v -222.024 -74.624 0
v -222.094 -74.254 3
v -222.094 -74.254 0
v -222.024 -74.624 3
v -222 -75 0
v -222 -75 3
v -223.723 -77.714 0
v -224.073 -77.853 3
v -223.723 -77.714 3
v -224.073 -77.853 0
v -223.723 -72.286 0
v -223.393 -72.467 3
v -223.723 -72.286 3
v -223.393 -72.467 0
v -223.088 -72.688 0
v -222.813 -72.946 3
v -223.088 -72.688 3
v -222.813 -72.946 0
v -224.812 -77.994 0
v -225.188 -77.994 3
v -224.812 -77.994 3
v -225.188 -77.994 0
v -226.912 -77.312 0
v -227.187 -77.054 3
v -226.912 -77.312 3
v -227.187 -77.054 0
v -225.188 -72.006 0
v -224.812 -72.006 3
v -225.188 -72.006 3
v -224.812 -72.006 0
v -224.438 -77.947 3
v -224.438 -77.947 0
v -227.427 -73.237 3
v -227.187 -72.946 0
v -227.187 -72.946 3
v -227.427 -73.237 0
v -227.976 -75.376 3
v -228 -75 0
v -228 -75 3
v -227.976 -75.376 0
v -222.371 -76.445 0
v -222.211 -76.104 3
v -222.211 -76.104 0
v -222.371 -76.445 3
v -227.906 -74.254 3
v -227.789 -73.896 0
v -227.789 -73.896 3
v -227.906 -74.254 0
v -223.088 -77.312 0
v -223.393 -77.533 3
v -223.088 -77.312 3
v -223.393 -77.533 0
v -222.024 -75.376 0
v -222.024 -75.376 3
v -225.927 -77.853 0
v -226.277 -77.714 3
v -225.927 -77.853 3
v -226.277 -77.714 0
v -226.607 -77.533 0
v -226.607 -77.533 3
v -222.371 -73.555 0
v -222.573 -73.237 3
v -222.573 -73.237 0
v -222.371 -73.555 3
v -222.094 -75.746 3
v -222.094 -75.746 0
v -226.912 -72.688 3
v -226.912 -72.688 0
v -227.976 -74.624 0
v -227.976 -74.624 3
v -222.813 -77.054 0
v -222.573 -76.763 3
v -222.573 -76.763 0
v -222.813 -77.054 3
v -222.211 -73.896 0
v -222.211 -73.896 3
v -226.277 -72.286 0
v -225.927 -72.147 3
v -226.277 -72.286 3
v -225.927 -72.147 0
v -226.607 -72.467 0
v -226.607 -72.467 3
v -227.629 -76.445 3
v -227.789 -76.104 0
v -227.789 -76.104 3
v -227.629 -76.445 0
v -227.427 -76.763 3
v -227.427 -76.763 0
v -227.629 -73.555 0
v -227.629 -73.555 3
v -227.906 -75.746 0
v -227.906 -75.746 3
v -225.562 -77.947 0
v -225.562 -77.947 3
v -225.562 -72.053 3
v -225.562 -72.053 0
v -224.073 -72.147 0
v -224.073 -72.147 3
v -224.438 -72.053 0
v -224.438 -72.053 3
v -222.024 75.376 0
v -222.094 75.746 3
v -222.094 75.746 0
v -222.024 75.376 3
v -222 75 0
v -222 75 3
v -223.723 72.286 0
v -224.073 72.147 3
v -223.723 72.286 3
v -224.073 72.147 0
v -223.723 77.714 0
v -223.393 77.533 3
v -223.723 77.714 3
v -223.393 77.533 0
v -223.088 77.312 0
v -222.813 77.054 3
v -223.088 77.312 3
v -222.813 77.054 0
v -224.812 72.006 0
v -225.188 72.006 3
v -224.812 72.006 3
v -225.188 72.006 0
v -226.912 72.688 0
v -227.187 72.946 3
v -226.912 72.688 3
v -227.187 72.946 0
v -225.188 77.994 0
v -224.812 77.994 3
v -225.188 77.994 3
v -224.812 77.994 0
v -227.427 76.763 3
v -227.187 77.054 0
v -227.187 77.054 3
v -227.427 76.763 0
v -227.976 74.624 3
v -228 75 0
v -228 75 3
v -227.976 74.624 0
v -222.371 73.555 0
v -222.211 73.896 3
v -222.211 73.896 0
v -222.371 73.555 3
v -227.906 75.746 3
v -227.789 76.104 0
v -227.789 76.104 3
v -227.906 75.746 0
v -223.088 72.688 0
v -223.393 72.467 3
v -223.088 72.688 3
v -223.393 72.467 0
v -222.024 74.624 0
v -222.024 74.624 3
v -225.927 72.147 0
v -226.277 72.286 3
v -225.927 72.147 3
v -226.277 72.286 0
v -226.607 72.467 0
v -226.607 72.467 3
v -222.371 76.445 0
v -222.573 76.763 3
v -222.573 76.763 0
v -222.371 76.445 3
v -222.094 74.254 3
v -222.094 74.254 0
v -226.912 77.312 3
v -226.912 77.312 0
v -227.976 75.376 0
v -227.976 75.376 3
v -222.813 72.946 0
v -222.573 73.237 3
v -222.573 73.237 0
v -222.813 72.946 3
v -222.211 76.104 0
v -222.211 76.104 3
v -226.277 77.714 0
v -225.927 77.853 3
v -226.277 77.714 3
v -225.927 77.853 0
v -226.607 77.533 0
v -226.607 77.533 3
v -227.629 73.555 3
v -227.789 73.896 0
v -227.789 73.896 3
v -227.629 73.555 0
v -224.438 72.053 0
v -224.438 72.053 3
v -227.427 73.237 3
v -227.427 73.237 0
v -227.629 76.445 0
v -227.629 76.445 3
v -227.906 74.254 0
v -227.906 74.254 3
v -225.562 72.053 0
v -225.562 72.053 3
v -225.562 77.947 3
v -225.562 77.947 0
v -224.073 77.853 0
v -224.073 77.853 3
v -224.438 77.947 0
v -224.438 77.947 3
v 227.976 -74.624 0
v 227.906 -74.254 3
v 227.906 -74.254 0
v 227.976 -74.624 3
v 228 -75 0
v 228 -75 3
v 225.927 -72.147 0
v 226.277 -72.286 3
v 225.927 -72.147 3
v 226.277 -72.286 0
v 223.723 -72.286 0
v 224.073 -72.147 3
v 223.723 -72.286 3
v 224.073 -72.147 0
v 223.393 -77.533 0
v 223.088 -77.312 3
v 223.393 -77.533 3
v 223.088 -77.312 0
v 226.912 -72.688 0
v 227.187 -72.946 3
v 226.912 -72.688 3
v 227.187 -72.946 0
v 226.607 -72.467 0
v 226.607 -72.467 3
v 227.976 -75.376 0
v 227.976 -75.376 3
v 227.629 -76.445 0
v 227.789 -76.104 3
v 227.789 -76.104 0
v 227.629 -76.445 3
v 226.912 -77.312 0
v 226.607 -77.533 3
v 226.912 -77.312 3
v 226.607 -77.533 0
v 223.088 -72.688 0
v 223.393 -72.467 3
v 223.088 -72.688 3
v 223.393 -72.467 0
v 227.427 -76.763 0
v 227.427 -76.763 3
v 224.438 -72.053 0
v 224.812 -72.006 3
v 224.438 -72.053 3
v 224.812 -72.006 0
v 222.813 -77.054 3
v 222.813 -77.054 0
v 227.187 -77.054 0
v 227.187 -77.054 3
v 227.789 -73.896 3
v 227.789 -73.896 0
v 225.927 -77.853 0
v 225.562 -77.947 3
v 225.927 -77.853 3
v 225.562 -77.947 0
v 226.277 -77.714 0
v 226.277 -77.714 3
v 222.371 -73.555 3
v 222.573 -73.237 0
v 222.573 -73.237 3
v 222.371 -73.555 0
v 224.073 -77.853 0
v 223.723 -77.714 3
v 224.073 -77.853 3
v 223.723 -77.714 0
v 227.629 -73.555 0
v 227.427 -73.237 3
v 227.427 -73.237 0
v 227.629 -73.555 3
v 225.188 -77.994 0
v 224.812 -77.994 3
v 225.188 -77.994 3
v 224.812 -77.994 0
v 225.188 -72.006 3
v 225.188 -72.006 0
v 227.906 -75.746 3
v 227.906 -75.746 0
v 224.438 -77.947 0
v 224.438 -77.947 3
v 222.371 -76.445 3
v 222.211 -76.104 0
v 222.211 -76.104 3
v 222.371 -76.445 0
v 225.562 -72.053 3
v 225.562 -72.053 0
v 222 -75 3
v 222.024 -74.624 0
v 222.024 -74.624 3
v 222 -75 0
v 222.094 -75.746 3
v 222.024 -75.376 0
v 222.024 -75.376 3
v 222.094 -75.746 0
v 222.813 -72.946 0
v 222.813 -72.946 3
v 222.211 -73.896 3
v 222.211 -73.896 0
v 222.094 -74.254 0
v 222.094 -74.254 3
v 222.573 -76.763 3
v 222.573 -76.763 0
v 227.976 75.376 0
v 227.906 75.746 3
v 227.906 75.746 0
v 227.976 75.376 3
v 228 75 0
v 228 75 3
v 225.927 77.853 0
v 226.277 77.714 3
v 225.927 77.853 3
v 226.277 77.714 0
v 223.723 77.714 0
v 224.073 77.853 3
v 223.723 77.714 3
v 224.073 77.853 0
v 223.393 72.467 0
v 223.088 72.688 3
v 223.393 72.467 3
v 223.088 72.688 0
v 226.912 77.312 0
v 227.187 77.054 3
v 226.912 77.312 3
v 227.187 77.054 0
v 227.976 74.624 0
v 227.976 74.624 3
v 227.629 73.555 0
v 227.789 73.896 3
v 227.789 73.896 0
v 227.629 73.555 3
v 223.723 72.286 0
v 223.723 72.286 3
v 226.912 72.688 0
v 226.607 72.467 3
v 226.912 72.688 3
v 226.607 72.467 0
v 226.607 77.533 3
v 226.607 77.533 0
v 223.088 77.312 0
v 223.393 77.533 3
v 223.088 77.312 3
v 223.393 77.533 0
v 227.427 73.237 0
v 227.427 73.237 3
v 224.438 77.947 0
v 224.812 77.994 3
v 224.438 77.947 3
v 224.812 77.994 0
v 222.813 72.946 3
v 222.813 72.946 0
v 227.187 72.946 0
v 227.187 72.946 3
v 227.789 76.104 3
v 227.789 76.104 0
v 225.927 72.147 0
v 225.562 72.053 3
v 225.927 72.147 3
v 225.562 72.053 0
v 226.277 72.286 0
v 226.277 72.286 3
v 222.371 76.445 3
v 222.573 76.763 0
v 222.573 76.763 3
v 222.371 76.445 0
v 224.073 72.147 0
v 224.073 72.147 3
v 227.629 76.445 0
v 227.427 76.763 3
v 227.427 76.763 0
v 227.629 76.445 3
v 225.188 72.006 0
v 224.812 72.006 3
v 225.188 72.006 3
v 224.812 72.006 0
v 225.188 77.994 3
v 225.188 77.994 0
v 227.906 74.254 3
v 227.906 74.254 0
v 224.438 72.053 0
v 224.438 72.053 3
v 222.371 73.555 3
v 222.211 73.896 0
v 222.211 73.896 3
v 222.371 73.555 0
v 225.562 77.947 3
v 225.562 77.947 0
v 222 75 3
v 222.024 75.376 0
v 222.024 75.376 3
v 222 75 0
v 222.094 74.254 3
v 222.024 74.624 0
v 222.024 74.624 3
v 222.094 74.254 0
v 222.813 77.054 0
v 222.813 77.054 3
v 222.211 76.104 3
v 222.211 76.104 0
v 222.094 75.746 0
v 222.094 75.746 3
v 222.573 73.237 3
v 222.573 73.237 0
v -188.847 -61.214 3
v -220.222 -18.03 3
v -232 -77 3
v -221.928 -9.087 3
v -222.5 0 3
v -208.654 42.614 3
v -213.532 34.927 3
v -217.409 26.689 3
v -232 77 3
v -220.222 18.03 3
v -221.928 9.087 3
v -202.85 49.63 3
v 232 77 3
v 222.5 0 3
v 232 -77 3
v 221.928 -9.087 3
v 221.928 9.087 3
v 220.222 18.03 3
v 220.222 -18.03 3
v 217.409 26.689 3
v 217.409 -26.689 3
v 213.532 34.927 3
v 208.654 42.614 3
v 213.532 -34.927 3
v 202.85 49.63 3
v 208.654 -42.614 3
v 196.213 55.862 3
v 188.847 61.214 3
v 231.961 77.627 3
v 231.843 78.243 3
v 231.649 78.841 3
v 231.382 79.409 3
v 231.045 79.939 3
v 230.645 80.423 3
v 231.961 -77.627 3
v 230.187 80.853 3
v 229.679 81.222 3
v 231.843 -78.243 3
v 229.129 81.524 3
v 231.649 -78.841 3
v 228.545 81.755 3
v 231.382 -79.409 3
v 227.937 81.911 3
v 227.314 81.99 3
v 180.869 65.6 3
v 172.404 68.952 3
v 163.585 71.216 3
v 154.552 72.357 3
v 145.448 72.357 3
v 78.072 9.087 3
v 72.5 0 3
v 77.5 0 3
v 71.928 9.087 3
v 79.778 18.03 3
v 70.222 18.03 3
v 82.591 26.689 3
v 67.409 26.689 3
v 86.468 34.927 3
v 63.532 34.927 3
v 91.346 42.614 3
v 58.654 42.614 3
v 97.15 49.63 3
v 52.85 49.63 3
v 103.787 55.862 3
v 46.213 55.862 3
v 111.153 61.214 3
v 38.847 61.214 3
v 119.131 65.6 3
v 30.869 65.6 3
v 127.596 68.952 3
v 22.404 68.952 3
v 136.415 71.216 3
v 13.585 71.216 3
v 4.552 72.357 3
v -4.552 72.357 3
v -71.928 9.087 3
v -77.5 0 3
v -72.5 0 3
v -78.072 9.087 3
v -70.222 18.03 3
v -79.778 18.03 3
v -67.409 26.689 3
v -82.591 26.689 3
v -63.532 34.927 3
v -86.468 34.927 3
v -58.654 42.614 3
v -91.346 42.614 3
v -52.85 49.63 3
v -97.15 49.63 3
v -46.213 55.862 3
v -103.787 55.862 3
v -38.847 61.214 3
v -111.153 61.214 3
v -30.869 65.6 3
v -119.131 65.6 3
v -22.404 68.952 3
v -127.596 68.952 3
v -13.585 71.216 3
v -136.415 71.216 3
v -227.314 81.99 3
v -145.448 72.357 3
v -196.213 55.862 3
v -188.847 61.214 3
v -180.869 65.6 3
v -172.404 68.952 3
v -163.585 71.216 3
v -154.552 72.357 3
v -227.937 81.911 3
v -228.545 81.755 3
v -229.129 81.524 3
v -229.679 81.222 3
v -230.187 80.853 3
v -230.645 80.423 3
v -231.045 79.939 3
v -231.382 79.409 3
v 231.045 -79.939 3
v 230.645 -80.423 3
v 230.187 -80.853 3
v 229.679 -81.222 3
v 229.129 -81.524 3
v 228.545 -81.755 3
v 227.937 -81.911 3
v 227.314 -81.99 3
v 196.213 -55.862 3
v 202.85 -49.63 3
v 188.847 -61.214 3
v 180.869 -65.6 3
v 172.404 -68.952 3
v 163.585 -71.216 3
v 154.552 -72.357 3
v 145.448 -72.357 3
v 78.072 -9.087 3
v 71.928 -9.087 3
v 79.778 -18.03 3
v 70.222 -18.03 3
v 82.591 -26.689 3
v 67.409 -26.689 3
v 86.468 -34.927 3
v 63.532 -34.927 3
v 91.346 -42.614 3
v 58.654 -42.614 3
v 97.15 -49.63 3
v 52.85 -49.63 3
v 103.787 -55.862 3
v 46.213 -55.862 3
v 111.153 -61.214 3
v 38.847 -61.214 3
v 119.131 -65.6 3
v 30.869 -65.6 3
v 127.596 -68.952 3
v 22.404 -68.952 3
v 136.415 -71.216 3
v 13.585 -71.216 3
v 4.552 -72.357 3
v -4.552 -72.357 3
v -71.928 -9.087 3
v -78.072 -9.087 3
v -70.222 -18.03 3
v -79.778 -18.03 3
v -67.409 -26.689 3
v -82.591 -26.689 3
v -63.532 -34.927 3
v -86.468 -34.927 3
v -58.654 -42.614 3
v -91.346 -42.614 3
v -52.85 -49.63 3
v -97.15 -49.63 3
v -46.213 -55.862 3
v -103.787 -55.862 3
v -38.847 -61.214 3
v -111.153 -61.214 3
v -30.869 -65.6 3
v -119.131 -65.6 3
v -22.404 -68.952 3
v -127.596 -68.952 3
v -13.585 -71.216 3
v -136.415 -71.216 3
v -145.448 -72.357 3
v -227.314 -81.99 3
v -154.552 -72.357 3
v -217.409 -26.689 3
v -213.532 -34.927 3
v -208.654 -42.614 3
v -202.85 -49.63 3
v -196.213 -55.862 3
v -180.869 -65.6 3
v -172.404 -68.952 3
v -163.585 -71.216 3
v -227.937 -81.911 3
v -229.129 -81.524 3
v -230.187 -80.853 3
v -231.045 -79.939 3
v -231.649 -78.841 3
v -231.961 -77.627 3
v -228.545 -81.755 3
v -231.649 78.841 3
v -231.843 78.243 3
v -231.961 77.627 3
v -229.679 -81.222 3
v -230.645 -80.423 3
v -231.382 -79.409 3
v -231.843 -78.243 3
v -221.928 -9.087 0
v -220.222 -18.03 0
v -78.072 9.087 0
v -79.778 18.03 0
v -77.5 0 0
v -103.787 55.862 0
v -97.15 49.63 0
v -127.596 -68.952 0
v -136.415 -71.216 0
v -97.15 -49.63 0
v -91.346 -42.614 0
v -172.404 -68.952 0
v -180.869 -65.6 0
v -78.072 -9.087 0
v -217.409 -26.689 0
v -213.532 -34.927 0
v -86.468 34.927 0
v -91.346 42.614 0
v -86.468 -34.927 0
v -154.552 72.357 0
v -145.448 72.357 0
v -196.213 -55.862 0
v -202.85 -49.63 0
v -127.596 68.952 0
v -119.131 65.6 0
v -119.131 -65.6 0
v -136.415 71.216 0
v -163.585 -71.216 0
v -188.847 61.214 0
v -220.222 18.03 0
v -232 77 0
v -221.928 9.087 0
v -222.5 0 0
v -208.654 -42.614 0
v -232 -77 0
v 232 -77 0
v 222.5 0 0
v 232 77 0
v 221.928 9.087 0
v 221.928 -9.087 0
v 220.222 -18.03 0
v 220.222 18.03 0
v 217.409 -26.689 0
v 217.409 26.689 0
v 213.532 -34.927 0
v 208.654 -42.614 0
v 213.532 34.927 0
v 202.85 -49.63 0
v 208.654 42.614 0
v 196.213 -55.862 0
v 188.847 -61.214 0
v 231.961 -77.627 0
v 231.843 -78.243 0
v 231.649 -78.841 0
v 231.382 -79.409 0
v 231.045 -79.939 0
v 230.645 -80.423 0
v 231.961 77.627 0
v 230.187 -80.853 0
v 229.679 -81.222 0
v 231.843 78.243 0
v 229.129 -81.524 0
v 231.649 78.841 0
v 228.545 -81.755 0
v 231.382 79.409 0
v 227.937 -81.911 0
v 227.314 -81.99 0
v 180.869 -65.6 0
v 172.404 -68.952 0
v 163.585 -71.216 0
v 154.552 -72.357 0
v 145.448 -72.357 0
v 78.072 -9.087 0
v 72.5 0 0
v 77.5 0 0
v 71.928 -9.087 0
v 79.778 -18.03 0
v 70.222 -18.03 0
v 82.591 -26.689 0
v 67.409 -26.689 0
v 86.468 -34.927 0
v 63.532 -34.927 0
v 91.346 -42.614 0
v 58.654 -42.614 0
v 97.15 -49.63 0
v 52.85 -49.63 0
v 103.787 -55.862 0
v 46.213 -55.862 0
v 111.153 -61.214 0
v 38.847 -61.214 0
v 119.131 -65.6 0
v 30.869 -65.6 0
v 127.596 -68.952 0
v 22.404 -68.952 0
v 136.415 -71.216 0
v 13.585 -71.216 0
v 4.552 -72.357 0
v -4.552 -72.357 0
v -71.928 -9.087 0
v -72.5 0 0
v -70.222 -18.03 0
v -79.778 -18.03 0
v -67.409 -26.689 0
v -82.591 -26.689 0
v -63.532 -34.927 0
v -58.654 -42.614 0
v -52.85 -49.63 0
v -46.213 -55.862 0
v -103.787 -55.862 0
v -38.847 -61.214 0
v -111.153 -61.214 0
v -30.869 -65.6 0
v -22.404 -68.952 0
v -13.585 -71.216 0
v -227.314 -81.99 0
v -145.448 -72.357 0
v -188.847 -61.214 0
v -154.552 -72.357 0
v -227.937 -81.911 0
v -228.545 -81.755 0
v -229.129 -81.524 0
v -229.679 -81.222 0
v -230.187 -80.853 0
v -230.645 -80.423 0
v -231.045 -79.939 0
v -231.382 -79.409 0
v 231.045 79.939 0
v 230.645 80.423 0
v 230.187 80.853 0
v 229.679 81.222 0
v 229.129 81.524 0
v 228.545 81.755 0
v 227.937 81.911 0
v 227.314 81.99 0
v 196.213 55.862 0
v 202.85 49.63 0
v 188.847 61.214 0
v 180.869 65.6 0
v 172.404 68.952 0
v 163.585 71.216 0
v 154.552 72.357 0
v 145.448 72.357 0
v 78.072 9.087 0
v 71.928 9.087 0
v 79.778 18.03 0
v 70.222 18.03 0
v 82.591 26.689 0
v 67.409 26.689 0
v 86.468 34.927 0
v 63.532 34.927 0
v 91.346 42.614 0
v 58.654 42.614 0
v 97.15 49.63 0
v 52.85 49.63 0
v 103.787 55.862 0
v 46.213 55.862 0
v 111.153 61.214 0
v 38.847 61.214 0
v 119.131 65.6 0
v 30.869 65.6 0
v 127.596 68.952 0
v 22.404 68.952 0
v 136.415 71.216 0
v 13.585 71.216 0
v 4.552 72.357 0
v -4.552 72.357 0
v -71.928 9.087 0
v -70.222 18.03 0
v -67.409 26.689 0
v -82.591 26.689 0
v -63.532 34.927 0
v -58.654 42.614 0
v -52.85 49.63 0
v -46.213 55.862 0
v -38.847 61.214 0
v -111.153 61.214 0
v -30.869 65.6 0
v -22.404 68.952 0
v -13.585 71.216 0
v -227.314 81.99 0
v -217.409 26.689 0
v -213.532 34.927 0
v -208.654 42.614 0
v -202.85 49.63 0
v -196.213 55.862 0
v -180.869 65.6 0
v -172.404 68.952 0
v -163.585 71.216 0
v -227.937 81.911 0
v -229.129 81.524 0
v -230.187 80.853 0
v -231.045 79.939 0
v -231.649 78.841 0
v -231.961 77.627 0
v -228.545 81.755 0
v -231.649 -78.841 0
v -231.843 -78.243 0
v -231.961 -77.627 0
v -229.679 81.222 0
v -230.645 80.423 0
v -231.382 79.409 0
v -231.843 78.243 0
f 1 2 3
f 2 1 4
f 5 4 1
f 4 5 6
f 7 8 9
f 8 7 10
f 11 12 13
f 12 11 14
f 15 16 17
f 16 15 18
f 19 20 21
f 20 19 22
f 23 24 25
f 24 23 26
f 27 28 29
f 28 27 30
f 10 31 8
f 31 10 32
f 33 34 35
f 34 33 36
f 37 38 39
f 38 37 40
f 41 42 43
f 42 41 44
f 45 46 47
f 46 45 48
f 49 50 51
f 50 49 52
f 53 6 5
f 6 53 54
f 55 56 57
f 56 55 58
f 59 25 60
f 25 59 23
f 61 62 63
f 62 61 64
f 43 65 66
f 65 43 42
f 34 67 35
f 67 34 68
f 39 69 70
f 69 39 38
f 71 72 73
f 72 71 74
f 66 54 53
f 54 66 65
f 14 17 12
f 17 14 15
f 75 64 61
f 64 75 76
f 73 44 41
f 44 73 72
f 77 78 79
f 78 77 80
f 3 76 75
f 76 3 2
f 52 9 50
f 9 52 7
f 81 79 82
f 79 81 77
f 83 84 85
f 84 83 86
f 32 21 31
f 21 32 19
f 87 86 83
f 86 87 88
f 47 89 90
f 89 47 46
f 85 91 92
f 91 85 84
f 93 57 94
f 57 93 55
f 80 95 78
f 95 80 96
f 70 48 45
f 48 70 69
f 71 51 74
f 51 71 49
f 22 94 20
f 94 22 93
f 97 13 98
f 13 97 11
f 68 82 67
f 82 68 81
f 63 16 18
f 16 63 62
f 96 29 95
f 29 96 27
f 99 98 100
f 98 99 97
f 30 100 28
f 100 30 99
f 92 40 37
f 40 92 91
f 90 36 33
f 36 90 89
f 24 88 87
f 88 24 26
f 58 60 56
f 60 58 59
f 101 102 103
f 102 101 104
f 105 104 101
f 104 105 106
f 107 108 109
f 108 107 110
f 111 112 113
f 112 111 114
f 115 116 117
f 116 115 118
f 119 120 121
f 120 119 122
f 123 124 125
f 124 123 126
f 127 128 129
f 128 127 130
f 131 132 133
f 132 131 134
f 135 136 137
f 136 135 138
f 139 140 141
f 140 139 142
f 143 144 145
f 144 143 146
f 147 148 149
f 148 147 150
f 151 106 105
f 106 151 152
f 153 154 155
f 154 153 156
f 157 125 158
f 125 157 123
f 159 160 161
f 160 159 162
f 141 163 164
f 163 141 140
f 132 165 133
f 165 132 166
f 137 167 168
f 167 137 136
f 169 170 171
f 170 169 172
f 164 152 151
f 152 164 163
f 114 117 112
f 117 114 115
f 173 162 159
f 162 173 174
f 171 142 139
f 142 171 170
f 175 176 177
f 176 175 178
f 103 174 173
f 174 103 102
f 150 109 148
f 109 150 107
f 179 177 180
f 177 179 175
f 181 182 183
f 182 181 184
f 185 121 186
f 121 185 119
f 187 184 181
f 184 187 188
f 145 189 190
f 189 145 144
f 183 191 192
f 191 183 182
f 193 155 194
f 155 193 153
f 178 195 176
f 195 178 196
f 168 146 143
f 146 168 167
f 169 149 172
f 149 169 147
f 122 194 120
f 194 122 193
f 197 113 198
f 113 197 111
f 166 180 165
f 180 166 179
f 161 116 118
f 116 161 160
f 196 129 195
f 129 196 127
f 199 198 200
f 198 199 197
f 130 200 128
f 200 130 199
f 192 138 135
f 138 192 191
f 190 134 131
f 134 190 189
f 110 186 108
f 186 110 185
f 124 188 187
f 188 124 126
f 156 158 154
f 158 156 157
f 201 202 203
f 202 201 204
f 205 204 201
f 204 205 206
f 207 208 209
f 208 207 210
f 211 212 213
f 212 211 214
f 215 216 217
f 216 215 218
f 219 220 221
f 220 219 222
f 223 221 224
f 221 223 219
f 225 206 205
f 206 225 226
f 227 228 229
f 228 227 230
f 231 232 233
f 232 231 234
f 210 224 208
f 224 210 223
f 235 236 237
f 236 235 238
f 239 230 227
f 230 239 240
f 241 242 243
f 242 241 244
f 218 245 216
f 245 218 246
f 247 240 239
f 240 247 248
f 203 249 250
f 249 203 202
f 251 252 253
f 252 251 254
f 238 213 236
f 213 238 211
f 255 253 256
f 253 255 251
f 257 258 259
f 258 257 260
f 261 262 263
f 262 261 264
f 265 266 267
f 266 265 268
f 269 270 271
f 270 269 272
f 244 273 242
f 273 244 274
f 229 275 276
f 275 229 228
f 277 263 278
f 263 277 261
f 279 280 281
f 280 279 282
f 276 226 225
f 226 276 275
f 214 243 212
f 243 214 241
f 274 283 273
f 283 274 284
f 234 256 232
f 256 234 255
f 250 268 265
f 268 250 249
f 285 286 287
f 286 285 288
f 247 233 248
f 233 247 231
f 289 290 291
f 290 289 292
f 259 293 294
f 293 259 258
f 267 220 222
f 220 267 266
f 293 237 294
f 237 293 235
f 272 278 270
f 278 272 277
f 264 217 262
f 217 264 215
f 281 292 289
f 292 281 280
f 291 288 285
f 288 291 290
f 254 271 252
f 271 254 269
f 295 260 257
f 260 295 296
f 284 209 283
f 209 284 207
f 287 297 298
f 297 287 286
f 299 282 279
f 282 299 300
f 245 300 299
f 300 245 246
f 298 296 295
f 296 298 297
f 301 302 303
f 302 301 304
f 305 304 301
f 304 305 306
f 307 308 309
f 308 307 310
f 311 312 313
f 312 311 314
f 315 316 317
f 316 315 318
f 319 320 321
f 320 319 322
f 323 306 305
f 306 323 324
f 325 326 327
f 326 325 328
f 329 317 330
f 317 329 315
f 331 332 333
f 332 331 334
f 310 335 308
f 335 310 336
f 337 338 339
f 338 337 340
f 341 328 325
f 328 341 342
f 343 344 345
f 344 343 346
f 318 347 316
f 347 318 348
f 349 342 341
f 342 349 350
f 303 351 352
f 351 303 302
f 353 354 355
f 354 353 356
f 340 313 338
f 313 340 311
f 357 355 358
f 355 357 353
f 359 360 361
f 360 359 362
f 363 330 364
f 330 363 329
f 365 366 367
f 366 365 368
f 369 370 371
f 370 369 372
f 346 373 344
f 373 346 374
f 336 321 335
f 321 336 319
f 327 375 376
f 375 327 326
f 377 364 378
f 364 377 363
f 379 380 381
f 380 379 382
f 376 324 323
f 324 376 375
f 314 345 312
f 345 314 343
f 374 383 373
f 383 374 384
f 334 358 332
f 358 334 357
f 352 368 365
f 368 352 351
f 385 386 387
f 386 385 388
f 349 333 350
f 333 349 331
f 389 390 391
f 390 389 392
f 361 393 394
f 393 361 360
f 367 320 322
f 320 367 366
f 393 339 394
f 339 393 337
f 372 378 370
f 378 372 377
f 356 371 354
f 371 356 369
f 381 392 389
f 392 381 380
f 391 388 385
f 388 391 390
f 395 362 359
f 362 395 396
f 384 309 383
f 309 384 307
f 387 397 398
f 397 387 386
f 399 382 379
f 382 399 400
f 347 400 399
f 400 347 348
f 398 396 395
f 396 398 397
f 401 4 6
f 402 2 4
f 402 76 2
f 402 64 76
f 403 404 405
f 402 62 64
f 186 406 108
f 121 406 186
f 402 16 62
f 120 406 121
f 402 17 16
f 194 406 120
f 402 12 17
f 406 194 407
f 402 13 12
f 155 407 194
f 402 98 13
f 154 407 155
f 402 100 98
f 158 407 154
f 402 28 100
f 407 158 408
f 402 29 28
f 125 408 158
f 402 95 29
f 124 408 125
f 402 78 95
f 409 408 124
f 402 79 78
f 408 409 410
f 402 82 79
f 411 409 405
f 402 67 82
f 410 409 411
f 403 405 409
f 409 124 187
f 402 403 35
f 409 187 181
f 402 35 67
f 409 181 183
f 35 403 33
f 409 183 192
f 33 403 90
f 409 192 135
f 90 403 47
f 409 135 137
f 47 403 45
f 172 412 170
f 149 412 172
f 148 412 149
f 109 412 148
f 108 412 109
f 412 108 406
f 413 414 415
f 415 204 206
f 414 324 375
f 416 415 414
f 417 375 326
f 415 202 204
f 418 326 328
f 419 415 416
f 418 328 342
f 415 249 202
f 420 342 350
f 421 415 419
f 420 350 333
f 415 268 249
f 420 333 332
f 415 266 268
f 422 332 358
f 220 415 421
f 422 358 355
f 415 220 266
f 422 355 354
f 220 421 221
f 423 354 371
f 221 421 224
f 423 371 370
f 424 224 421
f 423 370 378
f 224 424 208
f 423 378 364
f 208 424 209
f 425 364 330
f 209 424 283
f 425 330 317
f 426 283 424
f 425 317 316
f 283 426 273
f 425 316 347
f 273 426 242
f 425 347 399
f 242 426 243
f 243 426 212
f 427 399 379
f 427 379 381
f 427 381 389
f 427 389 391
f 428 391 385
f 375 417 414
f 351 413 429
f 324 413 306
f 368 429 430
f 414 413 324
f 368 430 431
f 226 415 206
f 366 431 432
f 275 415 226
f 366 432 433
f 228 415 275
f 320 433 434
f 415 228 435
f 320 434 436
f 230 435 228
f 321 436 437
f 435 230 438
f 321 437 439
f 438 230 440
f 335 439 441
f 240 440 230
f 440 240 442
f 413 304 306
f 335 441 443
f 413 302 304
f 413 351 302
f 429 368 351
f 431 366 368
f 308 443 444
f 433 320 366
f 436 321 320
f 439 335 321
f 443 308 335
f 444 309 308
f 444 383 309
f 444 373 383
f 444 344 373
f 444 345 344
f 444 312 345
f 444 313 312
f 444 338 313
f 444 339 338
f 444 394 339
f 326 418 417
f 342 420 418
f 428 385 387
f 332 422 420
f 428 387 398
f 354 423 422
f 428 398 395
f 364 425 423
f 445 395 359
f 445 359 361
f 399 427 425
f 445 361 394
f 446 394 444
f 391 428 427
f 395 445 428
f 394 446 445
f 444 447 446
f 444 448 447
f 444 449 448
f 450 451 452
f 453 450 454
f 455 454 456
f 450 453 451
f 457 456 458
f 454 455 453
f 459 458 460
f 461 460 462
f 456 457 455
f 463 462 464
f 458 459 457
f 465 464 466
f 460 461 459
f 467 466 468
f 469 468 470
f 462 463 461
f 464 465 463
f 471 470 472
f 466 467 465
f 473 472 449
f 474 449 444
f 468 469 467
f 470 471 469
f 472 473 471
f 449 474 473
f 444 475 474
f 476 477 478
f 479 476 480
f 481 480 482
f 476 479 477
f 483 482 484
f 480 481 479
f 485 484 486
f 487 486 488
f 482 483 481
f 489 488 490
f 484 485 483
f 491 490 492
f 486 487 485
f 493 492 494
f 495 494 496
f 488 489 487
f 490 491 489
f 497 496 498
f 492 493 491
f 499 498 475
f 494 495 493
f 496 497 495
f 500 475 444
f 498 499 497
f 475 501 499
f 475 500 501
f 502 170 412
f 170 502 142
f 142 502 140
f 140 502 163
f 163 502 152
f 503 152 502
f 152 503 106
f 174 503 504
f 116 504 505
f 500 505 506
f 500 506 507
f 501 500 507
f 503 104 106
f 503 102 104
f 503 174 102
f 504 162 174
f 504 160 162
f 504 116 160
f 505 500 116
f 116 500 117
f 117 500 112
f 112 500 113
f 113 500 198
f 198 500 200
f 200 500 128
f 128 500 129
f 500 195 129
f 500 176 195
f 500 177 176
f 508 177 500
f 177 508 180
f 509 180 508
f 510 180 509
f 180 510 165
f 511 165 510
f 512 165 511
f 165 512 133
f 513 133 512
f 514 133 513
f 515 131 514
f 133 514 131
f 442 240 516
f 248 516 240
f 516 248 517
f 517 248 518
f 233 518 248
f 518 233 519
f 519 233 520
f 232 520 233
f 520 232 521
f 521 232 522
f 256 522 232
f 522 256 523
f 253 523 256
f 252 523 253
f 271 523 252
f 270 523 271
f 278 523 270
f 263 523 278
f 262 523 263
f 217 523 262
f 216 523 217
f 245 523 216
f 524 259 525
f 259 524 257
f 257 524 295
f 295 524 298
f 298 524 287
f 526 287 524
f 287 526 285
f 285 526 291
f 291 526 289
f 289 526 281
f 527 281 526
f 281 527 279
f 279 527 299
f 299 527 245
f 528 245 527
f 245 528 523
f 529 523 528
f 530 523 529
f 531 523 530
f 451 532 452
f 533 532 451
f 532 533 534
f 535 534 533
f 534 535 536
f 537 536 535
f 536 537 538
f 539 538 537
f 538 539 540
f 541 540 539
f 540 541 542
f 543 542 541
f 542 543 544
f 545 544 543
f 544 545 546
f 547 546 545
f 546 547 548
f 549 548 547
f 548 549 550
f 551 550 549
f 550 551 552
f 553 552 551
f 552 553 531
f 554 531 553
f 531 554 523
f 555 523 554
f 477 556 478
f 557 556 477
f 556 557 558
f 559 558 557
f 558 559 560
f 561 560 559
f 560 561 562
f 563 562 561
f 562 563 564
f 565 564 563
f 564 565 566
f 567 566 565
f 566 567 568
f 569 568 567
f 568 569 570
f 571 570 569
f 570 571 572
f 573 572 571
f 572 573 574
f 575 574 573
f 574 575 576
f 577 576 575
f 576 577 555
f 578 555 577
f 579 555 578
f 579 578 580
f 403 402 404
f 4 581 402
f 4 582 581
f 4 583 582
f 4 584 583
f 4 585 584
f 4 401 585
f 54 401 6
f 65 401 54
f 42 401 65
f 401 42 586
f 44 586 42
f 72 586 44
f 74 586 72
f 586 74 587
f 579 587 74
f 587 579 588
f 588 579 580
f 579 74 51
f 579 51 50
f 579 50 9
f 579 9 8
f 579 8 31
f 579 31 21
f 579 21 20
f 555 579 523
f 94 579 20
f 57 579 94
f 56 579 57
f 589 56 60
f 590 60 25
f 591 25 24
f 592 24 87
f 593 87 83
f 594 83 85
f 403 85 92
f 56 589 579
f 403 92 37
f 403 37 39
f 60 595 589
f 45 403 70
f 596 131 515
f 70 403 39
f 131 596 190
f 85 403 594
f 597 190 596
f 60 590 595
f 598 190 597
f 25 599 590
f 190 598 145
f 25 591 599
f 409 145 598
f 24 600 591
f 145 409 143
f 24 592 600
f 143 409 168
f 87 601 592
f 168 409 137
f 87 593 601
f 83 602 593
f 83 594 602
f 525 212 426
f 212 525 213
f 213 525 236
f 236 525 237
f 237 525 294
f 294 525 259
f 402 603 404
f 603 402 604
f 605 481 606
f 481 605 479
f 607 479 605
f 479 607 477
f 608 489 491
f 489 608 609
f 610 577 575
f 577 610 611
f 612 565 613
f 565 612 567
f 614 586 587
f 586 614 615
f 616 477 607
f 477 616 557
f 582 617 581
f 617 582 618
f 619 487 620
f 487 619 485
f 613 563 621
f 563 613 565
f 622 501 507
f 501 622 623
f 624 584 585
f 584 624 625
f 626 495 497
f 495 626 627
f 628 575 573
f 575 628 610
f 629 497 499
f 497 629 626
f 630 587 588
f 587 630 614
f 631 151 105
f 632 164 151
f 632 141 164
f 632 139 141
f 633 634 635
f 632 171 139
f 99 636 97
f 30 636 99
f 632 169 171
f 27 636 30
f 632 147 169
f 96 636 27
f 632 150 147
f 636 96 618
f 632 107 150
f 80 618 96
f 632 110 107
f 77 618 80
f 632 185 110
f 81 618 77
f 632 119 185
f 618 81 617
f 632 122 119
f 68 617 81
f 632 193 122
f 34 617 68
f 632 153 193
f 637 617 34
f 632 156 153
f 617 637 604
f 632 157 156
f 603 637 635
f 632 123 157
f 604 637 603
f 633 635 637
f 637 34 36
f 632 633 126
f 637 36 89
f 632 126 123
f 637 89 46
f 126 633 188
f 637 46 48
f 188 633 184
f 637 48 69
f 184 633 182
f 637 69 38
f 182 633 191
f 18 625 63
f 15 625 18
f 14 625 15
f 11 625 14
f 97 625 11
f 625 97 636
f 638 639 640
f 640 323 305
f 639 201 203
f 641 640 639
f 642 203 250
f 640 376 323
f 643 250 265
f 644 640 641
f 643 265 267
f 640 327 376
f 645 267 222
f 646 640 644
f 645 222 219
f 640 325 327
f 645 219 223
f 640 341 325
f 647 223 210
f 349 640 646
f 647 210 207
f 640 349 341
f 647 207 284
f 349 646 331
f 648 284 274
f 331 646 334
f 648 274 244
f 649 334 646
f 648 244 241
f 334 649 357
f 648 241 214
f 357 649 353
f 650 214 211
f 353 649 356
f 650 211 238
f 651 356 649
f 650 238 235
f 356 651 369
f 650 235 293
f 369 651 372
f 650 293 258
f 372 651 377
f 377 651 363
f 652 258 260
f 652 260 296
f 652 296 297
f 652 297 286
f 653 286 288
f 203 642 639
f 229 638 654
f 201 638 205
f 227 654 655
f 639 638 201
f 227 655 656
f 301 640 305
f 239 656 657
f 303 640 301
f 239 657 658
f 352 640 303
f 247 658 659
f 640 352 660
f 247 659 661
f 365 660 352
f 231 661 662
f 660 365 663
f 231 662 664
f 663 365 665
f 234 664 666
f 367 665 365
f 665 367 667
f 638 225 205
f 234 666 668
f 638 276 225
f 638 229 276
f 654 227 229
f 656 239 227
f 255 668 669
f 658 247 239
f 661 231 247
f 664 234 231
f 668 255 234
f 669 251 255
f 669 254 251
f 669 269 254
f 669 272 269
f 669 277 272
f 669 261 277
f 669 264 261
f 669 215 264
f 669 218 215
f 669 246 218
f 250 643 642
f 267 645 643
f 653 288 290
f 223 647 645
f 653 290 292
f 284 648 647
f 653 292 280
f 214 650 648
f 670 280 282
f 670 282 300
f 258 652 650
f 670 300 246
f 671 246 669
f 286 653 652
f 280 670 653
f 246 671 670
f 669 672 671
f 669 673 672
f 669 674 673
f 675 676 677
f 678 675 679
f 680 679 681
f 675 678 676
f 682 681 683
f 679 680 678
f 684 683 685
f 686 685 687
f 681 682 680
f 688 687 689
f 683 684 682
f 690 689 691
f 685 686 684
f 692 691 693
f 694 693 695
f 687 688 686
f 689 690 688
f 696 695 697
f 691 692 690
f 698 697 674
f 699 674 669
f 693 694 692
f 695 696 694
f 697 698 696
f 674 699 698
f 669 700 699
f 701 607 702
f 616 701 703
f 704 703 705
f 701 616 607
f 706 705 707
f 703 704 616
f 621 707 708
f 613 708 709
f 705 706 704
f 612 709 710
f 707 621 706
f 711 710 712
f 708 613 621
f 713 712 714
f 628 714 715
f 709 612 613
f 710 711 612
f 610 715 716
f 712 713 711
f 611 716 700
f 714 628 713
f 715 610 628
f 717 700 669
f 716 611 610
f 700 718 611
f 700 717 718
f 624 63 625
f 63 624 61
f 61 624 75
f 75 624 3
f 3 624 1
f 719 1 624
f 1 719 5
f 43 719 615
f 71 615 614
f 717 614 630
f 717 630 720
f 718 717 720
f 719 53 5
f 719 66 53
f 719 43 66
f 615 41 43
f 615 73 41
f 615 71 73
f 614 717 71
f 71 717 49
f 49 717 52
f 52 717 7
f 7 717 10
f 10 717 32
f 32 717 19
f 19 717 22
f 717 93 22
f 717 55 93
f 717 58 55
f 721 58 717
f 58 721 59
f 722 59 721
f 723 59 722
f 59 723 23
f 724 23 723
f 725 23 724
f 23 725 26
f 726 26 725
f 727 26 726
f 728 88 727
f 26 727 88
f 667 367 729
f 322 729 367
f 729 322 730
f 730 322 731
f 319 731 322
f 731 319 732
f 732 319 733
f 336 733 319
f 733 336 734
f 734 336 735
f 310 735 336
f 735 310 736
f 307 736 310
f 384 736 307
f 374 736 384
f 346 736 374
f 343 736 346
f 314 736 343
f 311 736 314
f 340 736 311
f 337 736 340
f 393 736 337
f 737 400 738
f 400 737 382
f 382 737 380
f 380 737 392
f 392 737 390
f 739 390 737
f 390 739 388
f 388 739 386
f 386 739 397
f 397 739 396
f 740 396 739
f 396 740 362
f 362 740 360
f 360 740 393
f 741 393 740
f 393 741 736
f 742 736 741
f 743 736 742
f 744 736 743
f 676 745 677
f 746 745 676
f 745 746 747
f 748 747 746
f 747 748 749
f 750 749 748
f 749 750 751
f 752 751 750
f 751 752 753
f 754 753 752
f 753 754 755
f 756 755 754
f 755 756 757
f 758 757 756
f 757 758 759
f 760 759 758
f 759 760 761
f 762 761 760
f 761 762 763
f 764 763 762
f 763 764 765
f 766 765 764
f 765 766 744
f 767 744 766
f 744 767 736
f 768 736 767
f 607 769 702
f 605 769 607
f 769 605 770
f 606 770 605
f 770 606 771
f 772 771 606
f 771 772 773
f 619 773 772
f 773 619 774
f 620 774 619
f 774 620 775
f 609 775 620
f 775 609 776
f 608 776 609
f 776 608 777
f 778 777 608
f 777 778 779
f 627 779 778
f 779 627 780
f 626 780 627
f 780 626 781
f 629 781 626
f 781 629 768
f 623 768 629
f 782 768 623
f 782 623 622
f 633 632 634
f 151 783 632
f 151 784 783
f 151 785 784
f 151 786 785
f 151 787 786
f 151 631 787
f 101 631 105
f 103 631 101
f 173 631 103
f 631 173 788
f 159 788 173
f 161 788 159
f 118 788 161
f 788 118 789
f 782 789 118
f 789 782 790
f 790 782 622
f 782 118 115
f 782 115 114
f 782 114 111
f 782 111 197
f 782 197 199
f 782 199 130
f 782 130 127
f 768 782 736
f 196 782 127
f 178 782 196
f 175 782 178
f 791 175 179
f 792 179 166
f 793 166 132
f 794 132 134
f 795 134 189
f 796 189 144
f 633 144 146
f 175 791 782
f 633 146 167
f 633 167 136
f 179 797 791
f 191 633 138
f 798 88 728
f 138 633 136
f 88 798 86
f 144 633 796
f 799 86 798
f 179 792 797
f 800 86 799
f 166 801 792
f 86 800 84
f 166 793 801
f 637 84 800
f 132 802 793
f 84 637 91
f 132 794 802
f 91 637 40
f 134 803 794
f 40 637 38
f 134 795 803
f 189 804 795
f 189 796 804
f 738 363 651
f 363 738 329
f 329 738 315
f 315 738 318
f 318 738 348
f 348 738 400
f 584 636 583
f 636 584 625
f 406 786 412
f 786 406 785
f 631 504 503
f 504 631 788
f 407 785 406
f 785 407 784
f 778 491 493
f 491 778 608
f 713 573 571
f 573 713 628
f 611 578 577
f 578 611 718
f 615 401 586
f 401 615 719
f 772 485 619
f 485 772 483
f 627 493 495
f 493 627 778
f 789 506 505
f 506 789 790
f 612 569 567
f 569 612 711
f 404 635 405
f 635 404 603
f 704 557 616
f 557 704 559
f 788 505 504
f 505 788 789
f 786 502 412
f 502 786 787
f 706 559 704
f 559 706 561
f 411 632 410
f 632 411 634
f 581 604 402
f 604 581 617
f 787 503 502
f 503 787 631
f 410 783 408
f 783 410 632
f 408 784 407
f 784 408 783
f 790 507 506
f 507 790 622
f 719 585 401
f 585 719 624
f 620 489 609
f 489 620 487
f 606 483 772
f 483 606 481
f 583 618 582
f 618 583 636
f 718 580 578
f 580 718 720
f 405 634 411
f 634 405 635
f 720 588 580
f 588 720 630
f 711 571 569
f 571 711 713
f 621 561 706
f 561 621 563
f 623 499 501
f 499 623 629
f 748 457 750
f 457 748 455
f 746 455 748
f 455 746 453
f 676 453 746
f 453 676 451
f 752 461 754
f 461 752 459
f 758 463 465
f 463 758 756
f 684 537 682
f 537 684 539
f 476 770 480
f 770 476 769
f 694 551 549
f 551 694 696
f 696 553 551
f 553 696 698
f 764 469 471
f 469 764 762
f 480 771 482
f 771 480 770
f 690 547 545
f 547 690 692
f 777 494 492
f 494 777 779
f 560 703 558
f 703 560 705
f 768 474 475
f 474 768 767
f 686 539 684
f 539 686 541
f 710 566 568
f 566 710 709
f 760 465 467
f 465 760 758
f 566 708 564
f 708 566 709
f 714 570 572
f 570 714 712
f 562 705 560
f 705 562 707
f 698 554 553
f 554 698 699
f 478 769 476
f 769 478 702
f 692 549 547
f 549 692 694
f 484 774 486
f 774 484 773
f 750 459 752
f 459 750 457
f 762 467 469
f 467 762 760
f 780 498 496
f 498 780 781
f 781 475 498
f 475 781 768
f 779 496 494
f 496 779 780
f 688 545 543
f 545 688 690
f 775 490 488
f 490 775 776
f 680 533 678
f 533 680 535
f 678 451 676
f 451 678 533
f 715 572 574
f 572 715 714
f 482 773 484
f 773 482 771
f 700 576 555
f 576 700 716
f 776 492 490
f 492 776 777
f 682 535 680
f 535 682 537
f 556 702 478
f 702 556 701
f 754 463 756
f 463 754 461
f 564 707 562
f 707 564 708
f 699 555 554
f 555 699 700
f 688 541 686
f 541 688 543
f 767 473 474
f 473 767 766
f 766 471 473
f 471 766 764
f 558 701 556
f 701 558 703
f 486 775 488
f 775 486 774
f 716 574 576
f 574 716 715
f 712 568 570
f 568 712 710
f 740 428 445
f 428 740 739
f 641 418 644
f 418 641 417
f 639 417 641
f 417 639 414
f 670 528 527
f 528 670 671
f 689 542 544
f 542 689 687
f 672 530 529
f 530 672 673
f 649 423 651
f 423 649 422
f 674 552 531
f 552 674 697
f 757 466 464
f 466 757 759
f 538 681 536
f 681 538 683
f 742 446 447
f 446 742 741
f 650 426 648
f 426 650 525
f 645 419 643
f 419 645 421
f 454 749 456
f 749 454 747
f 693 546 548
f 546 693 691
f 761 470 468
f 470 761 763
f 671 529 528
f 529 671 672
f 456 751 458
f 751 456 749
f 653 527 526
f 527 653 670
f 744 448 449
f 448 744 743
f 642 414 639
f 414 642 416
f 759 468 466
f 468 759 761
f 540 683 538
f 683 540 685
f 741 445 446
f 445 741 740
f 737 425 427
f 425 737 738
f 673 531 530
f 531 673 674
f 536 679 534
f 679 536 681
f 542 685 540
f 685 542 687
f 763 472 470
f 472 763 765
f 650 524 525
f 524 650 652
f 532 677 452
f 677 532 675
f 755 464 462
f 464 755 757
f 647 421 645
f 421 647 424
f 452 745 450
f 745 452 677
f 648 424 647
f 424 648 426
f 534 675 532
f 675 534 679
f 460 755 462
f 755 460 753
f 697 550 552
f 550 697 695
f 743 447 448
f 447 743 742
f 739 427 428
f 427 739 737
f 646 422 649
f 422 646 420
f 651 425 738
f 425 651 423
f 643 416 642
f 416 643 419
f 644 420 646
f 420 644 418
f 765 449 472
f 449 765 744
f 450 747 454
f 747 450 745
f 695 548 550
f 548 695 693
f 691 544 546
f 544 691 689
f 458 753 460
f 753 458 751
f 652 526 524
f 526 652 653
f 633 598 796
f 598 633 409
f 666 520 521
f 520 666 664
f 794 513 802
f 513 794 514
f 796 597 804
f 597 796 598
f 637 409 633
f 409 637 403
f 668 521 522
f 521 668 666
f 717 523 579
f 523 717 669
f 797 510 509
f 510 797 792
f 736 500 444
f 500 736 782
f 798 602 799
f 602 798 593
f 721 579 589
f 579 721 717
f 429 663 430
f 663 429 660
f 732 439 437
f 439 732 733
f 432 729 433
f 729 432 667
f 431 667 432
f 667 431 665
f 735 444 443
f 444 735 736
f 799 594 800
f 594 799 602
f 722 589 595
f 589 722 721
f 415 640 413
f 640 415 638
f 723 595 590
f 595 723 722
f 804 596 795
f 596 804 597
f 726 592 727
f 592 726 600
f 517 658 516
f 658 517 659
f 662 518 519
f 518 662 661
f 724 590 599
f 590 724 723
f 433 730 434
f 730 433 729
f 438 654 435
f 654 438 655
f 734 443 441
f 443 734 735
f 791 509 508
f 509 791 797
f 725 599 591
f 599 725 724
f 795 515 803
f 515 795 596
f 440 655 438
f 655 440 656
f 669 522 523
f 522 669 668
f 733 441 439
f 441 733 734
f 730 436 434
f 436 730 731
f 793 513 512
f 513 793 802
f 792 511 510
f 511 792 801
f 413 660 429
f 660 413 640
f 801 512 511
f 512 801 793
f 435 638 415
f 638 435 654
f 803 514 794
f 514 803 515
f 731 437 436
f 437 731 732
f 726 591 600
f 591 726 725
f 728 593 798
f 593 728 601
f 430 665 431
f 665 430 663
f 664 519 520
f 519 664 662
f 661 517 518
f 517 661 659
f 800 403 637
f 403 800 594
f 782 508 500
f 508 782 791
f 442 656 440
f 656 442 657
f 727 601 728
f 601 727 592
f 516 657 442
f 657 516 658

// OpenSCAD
$fn = 50;


difference() {
	union() {
		hull() {
			translate(v = [-227.0000000000, 77.0000000000, 0]) {
				cylinder(h = 3, r = 5);
			}
			translate(v = [227.0000000000, 77.0000000000, 0]) {
				cylinder(h = 3, r = 5);
			}
			translate(v = [-227.0000000000, -77.0000000000, 0]) {
				cylinder(h = 3, r = 5);
			}
			translate(v = [227.0000000000, -77.0000000000, 0]) {
				cylinder(h = 3, r = 5);
			}
		}
	}
	union() {
		#translate(v = [-225.0000000000, -75.0000000000, -100.0000000000]) {
			cylinder(h = 200, r = 3.0000000000);
		}
		#translate(v = [-225.0000000000, 75.0000000000, -100.0000000000]) {
			cylinder(h = 200, r = 3.0000000000);
		}
		#translate(v = [225.0000000000, -75.0000000000, -100.0000000000]) {
			cylinder(h = 200, r = 3.0000000000);
		}
		#translate(v = [225.0000000000, 75.0000000000, -100.0000000000]) {
			cylinder(h = 200, r = 3.0000000000);
		}
		#translate(v = [-150.0000000000, 0, 0]) {
			cylinder(h = 3, r = 72.5000000000);
		}
		#cylinder(h = 3, r = 72.5000000000);
		#translate(v = [150.0000000000, 0, 0]) {
			cylinder(h = 3, r = 72.5000000000);
		}
	}
}
